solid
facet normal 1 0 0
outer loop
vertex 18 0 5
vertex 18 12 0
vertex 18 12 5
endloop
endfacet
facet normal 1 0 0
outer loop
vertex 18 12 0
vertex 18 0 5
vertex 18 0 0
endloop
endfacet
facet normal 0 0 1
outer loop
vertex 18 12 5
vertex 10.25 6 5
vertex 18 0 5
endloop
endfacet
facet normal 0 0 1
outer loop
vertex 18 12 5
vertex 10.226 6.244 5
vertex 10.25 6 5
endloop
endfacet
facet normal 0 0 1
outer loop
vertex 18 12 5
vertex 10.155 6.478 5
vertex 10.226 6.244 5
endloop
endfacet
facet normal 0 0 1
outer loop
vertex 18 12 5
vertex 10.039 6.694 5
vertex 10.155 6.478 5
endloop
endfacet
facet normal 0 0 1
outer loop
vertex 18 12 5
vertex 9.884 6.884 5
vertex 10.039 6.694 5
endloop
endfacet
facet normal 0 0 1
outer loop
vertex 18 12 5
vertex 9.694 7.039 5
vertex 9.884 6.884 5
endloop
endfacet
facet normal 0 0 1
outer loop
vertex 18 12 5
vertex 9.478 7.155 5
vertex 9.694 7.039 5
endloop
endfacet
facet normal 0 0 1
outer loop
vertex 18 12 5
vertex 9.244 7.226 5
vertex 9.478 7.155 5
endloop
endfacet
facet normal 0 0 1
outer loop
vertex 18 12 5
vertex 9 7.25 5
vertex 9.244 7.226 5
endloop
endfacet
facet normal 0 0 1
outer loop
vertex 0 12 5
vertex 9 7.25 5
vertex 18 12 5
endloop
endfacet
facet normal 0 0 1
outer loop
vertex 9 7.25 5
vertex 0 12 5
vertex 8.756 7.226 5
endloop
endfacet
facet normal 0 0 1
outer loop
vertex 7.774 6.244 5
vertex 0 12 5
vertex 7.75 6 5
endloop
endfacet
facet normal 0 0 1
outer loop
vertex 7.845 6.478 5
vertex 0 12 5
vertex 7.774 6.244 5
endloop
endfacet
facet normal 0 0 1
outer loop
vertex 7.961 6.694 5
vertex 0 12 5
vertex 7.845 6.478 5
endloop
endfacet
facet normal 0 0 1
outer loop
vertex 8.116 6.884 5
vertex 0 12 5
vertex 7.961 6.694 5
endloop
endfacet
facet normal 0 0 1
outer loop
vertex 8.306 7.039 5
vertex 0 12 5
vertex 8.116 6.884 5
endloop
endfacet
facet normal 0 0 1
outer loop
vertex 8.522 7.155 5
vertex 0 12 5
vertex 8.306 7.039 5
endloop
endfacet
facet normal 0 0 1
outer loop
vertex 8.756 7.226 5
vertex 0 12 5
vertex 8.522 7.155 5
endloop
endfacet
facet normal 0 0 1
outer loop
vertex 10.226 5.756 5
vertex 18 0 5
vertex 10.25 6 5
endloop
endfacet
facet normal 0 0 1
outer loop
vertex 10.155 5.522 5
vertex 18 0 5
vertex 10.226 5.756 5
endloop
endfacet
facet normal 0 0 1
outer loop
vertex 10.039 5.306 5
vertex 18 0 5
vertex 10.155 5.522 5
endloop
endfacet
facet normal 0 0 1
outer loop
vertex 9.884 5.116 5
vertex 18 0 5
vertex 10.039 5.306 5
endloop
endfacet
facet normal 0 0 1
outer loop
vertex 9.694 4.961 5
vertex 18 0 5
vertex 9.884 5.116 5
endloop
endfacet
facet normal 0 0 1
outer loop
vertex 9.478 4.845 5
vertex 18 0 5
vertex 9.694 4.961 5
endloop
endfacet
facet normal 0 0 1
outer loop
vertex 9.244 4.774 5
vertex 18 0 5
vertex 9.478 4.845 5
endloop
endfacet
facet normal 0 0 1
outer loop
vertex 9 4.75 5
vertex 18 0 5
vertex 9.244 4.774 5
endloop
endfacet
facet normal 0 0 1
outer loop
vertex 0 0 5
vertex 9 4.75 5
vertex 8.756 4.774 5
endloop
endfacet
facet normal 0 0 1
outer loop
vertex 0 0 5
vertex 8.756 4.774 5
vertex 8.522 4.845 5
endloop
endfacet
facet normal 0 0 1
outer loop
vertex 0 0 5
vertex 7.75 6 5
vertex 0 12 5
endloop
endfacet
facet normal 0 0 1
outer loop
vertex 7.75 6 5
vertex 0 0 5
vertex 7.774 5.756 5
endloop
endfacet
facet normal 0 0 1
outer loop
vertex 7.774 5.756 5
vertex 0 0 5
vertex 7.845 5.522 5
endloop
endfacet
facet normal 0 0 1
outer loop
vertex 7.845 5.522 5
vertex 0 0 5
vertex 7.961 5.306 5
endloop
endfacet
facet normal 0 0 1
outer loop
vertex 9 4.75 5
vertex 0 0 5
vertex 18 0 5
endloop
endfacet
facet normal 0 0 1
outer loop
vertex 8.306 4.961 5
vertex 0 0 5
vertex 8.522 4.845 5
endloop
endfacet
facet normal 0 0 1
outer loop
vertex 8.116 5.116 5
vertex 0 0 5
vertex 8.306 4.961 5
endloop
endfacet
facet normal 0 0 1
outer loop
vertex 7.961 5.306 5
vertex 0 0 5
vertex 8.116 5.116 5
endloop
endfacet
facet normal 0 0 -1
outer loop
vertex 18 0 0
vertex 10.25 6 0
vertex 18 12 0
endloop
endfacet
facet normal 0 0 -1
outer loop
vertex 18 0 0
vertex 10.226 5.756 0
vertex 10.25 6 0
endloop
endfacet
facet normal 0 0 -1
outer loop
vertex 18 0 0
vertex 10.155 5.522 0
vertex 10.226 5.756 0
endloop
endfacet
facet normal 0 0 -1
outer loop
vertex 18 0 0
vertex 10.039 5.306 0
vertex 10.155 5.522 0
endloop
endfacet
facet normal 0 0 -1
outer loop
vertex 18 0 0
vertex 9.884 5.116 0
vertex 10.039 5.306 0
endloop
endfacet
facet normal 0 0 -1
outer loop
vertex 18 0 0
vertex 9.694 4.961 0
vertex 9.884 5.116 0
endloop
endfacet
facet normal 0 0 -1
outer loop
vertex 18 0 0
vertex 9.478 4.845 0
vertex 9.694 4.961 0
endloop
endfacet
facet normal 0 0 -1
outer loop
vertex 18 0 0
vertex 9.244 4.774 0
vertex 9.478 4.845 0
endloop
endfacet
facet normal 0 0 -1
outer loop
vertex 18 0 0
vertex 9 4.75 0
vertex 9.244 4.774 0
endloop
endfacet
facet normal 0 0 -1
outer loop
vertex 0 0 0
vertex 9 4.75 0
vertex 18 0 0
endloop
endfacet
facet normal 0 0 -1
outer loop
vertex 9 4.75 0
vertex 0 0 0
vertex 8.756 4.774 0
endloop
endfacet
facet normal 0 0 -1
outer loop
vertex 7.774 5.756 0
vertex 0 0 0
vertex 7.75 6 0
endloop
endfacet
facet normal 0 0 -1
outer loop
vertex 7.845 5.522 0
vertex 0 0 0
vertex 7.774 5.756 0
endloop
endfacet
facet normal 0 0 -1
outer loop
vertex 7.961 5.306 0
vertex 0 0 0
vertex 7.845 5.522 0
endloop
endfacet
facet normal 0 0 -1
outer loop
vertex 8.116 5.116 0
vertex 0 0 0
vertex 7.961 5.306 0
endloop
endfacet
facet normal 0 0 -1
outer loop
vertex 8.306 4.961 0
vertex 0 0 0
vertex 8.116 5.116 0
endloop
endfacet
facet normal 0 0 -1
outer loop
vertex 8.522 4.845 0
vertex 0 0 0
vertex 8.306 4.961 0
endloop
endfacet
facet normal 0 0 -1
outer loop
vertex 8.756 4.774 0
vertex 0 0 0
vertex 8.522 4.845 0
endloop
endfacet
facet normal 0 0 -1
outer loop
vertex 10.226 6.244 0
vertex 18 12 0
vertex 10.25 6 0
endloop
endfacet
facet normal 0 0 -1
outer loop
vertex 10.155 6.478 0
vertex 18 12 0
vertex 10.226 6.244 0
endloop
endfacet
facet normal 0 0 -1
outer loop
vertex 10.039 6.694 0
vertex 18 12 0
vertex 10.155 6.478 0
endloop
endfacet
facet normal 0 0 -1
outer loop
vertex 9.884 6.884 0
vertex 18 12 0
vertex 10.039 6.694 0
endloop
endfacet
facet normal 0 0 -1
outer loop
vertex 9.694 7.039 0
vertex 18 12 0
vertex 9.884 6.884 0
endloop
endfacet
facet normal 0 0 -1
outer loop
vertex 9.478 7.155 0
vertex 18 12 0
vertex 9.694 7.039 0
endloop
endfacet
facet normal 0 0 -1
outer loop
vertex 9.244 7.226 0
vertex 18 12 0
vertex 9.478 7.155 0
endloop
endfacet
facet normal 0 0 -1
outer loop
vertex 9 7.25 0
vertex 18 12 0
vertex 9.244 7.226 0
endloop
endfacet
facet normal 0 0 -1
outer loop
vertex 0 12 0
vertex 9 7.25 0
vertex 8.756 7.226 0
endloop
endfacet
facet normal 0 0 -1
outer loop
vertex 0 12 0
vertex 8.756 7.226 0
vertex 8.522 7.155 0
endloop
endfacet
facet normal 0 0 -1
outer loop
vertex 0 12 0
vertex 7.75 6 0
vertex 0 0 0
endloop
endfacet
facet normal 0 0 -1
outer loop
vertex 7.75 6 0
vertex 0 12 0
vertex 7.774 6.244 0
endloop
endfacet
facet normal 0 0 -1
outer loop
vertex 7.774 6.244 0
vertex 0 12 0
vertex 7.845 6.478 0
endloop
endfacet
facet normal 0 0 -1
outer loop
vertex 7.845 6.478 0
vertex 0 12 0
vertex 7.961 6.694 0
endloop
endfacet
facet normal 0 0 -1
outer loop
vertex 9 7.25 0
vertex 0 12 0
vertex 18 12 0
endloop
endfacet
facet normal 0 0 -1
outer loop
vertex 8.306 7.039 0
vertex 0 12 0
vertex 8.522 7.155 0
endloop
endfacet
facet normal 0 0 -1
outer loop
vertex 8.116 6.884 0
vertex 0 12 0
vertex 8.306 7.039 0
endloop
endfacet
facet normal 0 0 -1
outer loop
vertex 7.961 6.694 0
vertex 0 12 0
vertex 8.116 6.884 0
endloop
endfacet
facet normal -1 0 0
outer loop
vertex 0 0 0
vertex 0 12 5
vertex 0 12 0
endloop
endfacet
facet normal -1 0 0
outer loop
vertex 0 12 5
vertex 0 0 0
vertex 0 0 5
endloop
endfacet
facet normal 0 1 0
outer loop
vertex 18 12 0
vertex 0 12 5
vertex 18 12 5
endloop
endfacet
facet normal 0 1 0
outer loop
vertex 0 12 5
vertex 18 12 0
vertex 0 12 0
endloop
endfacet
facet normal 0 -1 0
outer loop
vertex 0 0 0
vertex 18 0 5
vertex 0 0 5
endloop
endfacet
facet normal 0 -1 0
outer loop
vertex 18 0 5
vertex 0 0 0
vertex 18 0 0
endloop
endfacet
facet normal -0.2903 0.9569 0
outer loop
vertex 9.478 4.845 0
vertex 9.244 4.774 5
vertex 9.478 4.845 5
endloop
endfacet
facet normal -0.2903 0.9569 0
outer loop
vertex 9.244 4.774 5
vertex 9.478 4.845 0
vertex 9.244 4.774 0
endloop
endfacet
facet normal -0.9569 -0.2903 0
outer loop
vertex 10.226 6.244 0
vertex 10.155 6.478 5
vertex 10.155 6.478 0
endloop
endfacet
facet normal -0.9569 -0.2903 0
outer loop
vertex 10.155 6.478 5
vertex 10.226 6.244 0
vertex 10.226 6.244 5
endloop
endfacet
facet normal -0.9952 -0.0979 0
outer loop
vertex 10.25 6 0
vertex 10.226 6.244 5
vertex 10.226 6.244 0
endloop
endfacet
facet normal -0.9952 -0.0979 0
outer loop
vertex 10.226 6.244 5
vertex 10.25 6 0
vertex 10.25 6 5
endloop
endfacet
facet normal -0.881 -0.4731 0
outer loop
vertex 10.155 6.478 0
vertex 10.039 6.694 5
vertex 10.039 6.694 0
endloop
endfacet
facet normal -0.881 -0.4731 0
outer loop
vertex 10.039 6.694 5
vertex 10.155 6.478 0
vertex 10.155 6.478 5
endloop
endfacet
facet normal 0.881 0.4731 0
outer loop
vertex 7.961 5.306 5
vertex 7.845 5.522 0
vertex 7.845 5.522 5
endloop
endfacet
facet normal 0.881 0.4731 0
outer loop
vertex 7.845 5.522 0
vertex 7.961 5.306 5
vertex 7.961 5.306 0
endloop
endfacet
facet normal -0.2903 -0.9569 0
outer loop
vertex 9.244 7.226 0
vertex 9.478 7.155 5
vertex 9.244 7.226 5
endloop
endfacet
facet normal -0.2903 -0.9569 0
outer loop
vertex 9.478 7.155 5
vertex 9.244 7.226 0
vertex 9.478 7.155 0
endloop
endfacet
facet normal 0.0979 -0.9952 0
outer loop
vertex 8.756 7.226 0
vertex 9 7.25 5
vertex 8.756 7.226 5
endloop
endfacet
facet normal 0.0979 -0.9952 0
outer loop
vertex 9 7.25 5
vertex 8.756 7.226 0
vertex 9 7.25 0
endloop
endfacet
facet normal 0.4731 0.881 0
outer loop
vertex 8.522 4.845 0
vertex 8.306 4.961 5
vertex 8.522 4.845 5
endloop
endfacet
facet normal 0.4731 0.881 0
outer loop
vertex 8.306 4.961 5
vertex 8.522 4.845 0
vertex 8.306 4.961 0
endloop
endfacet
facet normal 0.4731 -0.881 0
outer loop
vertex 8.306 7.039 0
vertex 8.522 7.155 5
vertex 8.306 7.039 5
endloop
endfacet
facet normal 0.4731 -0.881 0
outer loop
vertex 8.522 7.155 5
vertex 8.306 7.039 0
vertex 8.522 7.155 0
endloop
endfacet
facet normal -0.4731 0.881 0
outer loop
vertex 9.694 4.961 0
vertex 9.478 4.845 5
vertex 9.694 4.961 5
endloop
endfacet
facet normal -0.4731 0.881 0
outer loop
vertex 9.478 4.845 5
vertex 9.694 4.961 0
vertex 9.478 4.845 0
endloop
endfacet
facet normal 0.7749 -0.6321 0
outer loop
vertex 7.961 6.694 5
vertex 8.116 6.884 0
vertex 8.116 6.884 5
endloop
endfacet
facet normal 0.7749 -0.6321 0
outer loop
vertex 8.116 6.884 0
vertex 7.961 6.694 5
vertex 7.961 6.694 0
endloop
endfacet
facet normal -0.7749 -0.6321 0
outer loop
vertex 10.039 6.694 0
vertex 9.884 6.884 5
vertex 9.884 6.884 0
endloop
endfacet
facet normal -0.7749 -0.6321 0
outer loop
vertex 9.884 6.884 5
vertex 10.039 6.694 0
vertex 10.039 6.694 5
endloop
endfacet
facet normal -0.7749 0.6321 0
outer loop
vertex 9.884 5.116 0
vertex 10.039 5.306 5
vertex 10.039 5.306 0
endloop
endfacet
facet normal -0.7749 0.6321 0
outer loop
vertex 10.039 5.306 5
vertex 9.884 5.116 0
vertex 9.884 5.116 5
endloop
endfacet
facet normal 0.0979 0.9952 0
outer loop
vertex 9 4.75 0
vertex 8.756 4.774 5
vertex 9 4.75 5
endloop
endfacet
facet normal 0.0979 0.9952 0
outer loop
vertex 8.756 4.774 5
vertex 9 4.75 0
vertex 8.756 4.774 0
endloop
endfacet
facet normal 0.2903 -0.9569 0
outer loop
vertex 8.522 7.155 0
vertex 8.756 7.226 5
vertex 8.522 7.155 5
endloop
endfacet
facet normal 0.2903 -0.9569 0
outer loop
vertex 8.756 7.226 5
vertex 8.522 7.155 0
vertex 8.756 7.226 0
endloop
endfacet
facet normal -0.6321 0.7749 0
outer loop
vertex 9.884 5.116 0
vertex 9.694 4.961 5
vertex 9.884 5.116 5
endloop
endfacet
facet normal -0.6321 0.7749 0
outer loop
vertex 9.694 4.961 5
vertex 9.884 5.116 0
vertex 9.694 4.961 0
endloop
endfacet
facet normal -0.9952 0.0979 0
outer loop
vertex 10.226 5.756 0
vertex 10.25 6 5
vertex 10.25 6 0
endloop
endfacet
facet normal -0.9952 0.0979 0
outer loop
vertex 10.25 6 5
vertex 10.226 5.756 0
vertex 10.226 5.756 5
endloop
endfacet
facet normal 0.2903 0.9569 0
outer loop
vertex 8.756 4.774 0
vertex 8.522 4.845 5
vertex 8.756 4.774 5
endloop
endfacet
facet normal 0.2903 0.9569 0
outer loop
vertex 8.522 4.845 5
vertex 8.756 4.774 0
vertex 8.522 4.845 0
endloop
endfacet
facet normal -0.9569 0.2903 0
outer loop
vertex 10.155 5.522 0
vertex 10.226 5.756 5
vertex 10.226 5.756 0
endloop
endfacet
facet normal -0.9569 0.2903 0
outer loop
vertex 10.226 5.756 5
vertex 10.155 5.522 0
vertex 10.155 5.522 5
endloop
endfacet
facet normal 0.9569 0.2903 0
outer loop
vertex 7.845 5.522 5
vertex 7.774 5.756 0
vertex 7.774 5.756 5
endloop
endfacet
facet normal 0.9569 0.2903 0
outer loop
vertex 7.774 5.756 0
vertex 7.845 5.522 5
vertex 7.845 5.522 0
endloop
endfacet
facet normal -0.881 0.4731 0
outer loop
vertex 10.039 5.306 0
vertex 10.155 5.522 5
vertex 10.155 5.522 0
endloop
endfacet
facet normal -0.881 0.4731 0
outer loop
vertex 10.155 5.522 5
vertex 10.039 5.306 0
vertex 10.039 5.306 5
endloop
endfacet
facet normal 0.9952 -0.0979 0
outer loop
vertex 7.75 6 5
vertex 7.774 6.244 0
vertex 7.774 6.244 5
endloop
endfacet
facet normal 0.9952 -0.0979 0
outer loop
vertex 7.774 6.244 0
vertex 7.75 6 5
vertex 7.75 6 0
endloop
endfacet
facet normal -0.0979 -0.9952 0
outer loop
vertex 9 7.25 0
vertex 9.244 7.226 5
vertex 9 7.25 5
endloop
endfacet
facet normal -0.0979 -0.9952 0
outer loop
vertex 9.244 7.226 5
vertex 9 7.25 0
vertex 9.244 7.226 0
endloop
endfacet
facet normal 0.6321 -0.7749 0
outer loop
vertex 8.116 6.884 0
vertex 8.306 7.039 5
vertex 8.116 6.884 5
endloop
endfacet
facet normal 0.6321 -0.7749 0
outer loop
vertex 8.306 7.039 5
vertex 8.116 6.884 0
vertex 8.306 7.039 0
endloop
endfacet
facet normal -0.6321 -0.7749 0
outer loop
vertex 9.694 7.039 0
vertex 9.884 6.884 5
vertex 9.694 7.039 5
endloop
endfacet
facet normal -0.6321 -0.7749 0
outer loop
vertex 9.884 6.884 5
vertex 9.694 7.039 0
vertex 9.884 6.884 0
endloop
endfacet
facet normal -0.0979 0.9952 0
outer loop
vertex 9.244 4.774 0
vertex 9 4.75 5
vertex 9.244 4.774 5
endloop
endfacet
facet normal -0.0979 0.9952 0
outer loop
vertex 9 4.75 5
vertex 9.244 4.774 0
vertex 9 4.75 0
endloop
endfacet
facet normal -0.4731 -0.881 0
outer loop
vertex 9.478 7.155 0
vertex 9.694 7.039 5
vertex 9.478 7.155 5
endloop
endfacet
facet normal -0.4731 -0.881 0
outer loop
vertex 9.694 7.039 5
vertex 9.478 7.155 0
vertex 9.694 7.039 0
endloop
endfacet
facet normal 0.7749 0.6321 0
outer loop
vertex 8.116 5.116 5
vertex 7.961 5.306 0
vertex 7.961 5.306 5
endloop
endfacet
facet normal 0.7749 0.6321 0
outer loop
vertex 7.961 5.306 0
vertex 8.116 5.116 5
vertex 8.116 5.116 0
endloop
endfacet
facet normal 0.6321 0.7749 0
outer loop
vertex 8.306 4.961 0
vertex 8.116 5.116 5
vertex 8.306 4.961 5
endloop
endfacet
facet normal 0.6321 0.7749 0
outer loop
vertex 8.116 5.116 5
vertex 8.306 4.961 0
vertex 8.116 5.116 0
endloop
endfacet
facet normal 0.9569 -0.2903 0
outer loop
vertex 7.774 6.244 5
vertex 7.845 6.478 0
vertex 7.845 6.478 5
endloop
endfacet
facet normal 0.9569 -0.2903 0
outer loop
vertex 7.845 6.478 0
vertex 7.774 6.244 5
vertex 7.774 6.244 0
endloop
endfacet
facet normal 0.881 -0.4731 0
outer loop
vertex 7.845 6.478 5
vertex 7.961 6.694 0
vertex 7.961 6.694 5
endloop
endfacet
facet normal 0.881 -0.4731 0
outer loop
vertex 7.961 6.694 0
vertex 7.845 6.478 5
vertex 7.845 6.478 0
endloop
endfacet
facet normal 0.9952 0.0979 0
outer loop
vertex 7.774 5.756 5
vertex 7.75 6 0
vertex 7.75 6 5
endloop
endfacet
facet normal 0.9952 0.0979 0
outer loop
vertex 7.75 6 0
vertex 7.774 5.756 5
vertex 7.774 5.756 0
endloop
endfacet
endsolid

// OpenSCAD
$fn = 32;

// ----------------------------------------------------------------------
// Micro pad: drilled pad, 5-20 mm class
// ----------------------------------------------------------------------

// --- parameters (mm) ---
pad_l = 18;               // pad length, X
pad_w = 12;               // pad width, Y
pad_t = 5;                // pad thickness, Z
hole_d = 2.5;             // through hole diameter

difference() {
  cube([pad_l, pad_w, pad_t]);
  translate([pad_l / 2, pad_w / 2, -1])
    cylinder(h = pad_t + 2, d = hole_d);
}
